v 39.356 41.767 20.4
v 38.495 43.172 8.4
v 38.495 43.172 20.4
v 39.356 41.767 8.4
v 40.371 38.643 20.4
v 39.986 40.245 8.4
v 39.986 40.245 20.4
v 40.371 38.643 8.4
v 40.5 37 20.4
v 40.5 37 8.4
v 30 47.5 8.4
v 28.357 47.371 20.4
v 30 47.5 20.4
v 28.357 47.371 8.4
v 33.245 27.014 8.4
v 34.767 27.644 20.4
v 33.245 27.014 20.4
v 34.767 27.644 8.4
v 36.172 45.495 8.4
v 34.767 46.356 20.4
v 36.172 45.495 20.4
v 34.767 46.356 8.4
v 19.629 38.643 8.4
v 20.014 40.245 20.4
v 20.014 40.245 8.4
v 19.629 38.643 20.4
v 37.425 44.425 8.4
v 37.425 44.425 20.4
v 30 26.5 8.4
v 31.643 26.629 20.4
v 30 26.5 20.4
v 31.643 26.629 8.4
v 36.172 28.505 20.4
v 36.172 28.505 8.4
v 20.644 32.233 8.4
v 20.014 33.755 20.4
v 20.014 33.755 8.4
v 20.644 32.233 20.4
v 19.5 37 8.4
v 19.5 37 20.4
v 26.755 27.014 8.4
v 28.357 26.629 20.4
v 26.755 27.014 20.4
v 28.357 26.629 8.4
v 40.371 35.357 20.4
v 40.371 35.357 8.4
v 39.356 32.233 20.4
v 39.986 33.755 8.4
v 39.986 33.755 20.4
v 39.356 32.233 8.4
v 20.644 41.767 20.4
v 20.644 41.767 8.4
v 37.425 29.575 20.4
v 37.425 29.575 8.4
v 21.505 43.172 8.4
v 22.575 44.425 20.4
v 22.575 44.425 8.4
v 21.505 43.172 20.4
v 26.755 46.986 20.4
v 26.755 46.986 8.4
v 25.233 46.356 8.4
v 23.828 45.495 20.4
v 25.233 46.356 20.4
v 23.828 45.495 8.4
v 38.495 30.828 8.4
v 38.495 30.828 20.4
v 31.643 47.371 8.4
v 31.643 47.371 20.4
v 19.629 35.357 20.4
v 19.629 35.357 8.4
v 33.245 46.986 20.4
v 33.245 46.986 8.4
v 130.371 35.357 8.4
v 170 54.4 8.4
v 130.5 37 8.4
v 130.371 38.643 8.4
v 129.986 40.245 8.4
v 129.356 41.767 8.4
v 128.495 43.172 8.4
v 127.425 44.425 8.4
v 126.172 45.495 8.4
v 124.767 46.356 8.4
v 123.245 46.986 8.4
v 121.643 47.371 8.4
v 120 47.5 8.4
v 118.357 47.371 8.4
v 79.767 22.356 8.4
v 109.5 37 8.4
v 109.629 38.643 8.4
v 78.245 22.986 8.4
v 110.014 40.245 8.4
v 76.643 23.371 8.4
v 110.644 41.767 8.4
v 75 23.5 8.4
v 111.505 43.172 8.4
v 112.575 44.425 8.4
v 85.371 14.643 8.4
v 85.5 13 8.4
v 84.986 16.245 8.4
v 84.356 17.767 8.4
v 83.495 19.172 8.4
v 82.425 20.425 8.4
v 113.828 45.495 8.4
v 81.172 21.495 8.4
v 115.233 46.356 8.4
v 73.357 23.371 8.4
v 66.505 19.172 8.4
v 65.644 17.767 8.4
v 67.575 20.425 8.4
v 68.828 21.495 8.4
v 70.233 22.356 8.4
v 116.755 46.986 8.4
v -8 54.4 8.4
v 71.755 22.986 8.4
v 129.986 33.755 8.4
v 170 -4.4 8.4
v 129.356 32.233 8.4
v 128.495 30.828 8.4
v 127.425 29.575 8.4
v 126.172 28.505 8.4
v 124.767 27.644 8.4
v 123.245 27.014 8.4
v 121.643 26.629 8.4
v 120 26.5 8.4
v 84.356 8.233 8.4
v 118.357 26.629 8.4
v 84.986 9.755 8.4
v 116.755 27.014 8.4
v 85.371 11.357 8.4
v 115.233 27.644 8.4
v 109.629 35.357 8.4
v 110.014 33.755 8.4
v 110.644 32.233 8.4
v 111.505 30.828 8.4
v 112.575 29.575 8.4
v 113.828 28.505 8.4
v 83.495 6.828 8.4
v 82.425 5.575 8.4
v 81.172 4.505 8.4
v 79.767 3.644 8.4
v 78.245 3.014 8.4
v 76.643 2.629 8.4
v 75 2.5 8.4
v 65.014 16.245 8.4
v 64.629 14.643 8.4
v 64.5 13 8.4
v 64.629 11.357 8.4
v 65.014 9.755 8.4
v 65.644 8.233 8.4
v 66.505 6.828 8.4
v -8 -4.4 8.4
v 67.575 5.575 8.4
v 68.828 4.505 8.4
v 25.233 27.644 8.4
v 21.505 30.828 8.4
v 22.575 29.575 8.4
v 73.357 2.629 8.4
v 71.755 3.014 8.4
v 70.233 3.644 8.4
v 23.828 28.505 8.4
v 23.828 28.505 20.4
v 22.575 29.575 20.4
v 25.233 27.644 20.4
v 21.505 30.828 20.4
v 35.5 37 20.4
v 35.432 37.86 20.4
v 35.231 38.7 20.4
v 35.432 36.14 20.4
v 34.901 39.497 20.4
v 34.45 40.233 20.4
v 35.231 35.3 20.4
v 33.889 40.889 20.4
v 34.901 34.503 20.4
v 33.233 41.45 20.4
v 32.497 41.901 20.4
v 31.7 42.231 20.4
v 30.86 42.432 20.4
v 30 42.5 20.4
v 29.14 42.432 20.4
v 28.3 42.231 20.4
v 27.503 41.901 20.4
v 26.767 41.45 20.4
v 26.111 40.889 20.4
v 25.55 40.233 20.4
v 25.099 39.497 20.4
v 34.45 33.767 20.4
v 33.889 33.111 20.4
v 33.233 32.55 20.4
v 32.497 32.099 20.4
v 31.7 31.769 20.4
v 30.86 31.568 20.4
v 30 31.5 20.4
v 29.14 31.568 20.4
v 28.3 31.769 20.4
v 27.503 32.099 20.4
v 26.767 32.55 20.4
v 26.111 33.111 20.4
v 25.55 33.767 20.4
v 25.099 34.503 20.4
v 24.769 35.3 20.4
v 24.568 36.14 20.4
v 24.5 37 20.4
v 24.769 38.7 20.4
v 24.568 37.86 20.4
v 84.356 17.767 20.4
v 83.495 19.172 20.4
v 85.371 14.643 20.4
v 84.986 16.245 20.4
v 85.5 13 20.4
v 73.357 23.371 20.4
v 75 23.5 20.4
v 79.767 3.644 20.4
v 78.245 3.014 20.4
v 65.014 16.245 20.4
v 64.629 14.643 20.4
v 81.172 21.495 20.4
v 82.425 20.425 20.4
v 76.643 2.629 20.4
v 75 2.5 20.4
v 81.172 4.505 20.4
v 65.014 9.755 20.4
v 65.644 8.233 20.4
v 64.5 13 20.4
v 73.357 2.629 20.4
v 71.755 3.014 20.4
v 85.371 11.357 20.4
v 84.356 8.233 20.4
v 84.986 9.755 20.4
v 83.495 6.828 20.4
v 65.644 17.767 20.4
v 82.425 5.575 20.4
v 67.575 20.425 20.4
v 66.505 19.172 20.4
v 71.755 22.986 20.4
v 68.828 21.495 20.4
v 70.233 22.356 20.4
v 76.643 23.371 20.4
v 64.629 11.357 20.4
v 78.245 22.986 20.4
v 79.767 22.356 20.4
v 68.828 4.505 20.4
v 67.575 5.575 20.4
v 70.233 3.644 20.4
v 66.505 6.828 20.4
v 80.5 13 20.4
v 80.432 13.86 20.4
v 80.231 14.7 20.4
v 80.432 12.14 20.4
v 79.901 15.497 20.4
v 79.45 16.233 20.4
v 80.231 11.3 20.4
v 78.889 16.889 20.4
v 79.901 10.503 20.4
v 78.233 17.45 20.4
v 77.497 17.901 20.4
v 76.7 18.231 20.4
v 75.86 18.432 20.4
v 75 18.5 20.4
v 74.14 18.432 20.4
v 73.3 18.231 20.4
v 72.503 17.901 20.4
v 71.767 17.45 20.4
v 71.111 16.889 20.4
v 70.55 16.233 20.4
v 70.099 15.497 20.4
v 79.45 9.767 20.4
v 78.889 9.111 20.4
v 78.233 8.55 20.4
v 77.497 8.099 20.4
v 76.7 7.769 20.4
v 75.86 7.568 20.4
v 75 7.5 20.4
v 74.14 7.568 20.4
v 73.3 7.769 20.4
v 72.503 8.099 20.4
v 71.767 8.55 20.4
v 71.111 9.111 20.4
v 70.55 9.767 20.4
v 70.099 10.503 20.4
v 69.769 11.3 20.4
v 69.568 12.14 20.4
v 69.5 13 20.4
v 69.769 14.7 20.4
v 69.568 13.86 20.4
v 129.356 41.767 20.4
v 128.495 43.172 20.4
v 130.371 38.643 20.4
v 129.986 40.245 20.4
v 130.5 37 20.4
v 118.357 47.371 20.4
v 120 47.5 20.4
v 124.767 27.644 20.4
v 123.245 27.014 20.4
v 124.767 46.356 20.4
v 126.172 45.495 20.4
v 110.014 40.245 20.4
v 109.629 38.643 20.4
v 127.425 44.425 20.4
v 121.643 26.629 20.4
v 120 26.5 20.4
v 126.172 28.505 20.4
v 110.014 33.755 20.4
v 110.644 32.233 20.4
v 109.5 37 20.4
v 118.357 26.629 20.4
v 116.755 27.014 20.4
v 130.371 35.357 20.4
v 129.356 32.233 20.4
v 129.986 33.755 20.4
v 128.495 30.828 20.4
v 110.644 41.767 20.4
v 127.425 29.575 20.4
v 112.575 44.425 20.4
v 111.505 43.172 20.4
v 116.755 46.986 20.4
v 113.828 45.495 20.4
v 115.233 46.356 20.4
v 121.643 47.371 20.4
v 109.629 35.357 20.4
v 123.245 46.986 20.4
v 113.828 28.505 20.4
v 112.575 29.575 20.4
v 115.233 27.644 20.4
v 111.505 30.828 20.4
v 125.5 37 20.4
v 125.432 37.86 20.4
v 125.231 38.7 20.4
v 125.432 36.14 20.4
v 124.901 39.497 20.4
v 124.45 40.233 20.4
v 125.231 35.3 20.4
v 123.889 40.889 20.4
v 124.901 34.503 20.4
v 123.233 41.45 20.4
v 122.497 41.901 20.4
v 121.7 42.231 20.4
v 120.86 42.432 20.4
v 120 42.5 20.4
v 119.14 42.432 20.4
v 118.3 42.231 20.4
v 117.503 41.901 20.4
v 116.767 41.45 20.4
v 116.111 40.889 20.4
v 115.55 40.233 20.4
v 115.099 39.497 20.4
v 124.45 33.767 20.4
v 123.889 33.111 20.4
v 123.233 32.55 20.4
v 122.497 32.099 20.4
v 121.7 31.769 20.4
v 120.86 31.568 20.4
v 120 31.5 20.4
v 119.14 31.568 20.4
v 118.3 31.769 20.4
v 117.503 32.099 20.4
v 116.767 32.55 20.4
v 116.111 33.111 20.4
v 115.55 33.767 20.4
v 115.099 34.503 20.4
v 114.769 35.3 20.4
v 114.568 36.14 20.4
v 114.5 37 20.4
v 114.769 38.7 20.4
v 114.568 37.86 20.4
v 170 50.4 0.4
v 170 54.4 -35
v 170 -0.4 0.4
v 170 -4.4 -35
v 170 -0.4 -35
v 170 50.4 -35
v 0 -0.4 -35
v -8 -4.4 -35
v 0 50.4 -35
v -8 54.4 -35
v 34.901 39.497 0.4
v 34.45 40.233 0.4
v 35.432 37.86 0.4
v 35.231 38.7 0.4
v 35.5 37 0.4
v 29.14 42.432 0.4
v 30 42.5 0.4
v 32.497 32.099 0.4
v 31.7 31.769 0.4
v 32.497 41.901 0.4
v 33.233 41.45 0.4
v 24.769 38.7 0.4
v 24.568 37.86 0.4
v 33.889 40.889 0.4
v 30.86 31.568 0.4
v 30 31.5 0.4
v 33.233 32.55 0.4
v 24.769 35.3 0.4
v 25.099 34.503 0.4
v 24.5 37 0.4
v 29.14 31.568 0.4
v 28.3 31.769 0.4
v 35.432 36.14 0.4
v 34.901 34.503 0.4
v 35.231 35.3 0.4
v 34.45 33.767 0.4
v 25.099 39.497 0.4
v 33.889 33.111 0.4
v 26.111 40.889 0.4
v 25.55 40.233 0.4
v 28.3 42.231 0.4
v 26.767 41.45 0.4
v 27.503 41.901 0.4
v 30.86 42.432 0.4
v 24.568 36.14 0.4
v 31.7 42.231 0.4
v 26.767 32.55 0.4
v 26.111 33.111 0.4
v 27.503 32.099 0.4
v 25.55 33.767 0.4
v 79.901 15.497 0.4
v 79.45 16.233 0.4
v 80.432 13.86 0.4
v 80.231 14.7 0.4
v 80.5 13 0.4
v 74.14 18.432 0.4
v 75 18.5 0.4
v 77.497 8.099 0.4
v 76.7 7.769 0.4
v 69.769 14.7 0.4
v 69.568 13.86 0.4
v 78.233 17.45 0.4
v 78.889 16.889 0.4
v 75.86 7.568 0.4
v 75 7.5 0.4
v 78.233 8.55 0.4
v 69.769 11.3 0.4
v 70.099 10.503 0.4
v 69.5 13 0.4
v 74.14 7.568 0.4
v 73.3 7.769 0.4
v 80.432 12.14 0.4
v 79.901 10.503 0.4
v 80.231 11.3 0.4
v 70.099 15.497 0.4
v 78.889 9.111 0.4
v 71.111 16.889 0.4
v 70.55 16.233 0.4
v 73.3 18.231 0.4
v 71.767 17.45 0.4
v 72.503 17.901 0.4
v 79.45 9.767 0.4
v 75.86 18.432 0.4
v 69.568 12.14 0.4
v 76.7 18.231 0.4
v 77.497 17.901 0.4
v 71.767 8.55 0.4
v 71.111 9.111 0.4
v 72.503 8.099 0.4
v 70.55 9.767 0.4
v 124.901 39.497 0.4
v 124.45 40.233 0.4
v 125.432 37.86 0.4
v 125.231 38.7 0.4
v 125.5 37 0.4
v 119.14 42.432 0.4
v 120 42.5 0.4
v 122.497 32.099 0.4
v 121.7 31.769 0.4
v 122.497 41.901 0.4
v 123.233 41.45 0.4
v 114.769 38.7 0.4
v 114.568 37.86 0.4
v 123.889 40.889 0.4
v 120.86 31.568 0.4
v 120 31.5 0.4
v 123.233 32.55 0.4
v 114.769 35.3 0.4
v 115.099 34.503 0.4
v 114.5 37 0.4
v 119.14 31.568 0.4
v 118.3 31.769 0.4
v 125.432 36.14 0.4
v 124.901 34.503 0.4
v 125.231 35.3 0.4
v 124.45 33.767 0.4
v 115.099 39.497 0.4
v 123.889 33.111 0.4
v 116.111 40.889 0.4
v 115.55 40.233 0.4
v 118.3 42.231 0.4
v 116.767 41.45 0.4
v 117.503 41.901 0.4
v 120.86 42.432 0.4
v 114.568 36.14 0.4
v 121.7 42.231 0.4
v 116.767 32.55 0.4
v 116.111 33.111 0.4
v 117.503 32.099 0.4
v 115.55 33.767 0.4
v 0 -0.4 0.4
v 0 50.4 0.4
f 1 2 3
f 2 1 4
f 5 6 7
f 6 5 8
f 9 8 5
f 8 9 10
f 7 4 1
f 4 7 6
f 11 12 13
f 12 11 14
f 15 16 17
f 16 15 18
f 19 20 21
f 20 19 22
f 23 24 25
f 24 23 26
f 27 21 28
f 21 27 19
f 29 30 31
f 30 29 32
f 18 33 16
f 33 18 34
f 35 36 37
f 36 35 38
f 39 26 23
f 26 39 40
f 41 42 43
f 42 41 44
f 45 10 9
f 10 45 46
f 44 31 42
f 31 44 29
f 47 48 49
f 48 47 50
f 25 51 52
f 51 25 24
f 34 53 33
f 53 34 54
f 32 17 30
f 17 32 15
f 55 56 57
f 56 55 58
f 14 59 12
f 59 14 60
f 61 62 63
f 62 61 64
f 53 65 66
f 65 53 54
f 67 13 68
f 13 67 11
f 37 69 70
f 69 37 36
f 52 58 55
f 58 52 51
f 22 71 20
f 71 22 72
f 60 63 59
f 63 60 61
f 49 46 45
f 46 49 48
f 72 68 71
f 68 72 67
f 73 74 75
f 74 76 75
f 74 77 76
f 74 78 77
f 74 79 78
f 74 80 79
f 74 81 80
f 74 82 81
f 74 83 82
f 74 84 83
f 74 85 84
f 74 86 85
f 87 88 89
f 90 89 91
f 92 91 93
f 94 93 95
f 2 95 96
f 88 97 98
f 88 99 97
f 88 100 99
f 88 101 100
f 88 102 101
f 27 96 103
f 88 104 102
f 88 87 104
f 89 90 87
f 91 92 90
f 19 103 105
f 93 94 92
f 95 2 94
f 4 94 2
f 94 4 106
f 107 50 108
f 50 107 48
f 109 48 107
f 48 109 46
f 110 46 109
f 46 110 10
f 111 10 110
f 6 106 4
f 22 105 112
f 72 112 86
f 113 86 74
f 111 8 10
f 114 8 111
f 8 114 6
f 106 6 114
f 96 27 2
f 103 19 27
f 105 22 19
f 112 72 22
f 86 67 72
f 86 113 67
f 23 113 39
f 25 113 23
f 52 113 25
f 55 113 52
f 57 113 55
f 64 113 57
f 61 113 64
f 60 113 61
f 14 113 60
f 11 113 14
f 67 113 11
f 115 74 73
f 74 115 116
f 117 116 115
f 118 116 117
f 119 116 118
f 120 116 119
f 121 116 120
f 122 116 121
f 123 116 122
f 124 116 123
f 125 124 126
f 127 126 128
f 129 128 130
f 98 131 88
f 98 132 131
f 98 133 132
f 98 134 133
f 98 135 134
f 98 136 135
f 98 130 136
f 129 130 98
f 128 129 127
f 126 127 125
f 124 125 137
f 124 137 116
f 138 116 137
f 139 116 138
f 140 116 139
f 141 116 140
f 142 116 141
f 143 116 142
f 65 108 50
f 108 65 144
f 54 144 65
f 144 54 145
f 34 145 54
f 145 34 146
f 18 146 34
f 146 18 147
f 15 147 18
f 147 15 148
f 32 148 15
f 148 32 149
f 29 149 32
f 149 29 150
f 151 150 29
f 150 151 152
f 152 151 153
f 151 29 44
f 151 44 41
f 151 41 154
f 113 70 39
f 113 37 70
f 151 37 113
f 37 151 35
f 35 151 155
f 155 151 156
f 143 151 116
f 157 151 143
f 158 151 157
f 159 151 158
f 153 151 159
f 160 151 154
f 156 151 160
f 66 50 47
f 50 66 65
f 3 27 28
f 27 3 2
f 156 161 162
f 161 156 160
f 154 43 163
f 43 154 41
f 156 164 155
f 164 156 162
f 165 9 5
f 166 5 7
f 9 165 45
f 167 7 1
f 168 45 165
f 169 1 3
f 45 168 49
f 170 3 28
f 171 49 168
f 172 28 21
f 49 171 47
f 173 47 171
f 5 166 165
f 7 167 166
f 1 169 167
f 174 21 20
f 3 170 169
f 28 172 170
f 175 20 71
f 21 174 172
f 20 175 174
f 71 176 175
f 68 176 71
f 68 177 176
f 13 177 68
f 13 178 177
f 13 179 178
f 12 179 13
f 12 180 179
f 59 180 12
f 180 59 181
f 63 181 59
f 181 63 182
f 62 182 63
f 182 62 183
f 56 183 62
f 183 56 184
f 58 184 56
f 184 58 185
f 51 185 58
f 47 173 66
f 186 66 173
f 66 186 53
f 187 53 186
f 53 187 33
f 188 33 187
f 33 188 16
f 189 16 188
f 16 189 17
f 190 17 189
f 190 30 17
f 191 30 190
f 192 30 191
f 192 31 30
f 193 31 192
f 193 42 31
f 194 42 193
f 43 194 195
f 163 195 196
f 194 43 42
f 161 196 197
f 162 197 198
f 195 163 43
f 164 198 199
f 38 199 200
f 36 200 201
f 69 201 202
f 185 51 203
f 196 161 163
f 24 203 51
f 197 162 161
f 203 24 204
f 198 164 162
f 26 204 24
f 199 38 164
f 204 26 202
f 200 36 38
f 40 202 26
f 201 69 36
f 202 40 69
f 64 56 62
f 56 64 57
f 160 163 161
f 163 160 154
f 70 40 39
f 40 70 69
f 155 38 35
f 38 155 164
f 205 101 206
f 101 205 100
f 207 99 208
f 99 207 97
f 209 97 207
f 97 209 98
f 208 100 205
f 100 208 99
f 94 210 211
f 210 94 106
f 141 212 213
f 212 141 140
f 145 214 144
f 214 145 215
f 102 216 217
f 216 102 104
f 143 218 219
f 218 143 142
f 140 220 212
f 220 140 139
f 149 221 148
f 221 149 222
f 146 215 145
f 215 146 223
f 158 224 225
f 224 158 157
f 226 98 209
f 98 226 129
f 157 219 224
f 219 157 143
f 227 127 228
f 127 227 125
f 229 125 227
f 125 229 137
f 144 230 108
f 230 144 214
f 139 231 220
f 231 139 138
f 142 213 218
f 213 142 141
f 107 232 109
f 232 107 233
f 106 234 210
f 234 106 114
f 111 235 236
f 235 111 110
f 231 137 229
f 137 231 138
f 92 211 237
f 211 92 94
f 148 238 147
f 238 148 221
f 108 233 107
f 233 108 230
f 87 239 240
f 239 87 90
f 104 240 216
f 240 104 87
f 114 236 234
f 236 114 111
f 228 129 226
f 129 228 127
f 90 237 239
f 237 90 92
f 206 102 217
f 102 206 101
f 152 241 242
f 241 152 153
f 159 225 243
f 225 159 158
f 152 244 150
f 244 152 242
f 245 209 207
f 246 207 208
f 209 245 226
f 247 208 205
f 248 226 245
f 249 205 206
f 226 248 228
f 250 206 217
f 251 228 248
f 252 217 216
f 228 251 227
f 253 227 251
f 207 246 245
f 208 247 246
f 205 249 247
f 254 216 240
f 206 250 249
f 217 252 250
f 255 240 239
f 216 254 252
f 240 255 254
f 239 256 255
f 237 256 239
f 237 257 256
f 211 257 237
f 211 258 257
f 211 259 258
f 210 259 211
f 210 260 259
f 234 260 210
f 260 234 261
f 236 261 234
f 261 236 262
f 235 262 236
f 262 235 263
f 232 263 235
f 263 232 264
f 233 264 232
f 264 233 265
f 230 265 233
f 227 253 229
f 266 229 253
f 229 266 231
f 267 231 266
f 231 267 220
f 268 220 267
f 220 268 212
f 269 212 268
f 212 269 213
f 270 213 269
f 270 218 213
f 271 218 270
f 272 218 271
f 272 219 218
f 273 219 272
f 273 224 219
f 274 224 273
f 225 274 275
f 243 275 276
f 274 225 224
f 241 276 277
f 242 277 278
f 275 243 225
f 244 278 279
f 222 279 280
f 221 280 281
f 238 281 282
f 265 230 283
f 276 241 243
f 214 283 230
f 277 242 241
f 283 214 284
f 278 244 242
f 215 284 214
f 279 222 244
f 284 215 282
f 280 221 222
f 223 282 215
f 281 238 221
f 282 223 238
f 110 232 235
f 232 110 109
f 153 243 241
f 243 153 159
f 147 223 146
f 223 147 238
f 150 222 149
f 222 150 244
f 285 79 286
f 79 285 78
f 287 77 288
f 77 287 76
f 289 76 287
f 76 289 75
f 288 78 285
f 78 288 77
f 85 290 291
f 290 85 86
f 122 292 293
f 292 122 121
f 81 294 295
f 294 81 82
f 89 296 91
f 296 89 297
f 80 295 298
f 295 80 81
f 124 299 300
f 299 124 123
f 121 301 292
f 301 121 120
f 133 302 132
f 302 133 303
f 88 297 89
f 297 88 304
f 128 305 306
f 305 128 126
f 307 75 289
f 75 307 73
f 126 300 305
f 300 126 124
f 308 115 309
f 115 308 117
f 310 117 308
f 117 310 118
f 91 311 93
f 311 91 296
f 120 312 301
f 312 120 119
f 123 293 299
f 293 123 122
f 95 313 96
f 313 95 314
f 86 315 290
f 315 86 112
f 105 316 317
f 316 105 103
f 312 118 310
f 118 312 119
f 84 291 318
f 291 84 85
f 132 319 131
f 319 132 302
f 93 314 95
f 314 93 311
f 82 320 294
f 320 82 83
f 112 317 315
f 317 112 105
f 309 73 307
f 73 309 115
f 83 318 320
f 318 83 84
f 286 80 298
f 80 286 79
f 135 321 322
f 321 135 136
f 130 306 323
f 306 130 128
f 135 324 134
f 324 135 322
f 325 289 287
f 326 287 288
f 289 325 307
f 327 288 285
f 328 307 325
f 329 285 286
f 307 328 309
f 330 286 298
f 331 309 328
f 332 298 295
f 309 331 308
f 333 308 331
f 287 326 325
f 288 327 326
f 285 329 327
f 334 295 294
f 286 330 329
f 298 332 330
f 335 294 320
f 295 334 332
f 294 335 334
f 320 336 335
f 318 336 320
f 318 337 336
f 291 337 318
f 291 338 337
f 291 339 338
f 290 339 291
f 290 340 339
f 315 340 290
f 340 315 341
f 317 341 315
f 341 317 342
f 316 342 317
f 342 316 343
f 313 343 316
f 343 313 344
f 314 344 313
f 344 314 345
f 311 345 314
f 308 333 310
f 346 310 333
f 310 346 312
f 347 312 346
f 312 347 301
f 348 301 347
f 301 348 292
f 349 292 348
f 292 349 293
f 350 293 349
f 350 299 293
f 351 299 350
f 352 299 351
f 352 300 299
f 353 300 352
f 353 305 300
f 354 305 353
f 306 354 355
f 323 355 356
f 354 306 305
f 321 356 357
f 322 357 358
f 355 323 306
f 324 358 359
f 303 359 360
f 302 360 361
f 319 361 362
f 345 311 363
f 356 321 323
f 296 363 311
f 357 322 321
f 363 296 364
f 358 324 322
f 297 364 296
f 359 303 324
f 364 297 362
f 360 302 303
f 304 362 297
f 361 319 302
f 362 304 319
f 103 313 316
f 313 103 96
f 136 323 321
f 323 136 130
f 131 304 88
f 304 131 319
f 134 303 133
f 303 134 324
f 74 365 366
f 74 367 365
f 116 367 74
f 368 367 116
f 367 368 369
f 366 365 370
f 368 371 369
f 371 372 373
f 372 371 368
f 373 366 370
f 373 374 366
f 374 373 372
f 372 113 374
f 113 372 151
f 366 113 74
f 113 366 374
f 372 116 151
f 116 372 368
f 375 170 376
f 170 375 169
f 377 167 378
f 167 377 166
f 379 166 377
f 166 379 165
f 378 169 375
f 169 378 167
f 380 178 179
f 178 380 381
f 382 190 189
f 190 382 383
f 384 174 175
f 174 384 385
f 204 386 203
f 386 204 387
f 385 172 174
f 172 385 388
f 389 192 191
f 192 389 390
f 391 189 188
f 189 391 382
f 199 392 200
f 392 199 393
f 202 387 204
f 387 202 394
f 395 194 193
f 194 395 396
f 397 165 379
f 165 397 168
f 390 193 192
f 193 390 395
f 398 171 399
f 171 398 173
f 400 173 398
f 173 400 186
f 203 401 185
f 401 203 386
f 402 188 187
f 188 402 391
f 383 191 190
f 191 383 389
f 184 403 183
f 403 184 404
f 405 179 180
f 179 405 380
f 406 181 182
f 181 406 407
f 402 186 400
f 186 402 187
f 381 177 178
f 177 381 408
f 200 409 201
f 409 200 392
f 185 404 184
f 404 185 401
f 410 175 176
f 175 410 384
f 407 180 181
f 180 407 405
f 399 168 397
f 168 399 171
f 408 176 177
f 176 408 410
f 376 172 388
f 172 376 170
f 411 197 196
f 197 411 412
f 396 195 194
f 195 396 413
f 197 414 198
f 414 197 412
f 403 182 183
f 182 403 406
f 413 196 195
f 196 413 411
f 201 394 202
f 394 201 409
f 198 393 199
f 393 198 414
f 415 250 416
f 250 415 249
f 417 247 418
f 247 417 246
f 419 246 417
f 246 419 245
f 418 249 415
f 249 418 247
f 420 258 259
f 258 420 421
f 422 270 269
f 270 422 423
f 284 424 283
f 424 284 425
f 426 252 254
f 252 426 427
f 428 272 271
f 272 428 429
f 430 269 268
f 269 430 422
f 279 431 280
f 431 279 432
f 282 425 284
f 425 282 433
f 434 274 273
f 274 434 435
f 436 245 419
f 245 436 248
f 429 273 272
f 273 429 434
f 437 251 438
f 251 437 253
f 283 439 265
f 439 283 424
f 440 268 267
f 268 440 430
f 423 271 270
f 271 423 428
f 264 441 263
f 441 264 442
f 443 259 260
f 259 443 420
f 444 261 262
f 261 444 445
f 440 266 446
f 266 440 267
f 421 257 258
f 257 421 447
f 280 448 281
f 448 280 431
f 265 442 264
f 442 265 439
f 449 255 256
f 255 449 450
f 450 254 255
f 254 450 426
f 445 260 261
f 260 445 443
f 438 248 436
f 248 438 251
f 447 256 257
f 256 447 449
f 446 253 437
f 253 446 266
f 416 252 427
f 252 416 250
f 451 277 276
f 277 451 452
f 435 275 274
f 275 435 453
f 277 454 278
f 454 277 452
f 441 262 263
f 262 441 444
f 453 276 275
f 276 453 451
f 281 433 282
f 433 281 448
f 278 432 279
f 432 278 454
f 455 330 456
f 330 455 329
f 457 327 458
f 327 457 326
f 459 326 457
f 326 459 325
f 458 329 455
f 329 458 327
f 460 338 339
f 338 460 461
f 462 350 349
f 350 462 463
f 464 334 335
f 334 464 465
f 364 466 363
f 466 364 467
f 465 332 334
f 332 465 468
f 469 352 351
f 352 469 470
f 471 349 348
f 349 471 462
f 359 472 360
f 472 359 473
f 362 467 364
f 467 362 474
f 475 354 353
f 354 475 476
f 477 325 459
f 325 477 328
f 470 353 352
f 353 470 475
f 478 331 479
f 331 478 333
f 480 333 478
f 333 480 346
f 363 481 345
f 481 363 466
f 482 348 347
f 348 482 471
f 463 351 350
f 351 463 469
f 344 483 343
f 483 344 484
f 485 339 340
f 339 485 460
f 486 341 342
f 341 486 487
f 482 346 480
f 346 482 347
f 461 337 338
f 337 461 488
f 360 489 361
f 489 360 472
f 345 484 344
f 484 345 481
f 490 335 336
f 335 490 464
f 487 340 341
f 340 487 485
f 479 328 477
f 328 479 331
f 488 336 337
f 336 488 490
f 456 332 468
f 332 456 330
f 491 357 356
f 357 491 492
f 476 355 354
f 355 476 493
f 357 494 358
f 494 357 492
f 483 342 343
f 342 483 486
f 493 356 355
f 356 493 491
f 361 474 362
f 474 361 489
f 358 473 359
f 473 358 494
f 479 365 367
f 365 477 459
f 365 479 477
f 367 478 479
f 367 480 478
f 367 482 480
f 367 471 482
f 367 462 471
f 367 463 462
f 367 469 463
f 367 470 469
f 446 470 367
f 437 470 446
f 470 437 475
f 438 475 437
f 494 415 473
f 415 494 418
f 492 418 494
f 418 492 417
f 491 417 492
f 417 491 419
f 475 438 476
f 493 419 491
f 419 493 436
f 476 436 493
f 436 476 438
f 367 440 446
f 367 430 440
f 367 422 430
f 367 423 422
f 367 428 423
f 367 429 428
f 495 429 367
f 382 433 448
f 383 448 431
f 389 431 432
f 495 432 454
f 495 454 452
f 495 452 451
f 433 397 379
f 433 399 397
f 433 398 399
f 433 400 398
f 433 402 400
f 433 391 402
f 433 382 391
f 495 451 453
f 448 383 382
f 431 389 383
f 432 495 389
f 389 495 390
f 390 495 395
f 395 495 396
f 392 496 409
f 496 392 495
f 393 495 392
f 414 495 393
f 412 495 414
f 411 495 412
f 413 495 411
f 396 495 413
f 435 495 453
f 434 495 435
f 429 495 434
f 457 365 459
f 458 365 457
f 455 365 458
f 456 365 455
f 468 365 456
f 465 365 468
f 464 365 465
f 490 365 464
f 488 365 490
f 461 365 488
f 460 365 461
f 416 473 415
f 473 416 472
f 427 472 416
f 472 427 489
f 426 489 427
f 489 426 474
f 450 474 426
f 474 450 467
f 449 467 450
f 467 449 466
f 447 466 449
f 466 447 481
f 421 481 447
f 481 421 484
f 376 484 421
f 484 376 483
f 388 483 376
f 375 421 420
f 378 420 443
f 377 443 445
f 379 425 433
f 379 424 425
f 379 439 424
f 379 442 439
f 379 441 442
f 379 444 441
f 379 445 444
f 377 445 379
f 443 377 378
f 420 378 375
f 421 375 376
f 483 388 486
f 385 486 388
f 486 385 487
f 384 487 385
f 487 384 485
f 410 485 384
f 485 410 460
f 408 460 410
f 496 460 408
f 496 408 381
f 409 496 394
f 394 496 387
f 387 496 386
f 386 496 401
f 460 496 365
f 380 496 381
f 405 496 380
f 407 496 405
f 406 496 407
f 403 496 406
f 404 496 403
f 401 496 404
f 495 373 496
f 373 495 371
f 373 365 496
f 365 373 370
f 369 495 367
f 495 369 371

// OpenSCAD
/*
 * Offroad Adventure Trailer - 3D Printed Drill Guide
 *
 * Clamp-on saddle for the VKR 50x50 profiles that positions the zig-zag
 * bolt pattern without a CNC or marking-out. Print in PETG/PLA (100%
 * perimeters around the bushings). Slide onto the tube until the end
 * stop touches the tube end, clamp with a G-clamp, and drill 11 mm
 * through the bushings (holes are reamed after galvanizing anyway).
 *
 * Hole pattern matches corner_plate.scad bolt_holes_x():
 * 30 / 75 / 120 mm from the tube end, alternating +/-12 mm off center.
 * For the opposite tube wall, drill straight through with a long bit or
 * flip the guide to the other side of the corner (the pattern is
 * symmetric under 180-degree rotation about the tube axis).
 *
 * Origin: tube end at X=0, tube occupies Y 0..50 with its top face at Z=0.
 */

tube_w = 50;
clr = 0.4;          // print fit clearance around the tube
wall = 4;           // saddle side walls
top_t = 8;          // saddle top plate
side_drop = 35;     // how far the sides reach down the tube
stop_t = 8;         // end stop thickness
bush_h = 12;        // drill bushing height above the top plate
bush_wall = 5;
hole_dia = 11;      // M10 (reamed after galvanizing)
guide_len = 170;

// [distance from tube end, offset from tube centerline]
hole_pattern = [[30, 12], [75, -12], [120, 12]];

module drill_guide() {
    difference() {
        union() {
            // Saddle body + end stop
            translate([-stop_t, -wall - clr, -side_drop])
                cube([guide_len + stop_t, tube_w + 2*(wall + clr), side_drop + clr + top_t]);
            // Drill bushings
            for (h = hole_pattern)
                translate([h[0], tube_w/2 + h[1], clr + top_t])
                    cylinder(d=hole_dia + 2*bush_wall, h=bush_h, $fn=40);
        }

        // Tube channel (with fit clearance)
        translate([0, -clr, -side_drop - 1])
            cube([guide_len + 1, tube_w + 2*clr, side_drop + 1 + clr]);

        // Drill holes through top plate and bushings
        for (h = hole_pattern)
            translate([h[0], tube_w/2 + h[1], -1])
                cylinder(d=hole_dia, h=clr + top_t + bush_h + 2, $fn=40);
    }
}

// Renders if the file is opened standalone (with ghost tube)
color("orange") drill_guide();
%translate([0, 0, -tube_w]) cube([guide_len + 100, tube_w, tube_w]);
